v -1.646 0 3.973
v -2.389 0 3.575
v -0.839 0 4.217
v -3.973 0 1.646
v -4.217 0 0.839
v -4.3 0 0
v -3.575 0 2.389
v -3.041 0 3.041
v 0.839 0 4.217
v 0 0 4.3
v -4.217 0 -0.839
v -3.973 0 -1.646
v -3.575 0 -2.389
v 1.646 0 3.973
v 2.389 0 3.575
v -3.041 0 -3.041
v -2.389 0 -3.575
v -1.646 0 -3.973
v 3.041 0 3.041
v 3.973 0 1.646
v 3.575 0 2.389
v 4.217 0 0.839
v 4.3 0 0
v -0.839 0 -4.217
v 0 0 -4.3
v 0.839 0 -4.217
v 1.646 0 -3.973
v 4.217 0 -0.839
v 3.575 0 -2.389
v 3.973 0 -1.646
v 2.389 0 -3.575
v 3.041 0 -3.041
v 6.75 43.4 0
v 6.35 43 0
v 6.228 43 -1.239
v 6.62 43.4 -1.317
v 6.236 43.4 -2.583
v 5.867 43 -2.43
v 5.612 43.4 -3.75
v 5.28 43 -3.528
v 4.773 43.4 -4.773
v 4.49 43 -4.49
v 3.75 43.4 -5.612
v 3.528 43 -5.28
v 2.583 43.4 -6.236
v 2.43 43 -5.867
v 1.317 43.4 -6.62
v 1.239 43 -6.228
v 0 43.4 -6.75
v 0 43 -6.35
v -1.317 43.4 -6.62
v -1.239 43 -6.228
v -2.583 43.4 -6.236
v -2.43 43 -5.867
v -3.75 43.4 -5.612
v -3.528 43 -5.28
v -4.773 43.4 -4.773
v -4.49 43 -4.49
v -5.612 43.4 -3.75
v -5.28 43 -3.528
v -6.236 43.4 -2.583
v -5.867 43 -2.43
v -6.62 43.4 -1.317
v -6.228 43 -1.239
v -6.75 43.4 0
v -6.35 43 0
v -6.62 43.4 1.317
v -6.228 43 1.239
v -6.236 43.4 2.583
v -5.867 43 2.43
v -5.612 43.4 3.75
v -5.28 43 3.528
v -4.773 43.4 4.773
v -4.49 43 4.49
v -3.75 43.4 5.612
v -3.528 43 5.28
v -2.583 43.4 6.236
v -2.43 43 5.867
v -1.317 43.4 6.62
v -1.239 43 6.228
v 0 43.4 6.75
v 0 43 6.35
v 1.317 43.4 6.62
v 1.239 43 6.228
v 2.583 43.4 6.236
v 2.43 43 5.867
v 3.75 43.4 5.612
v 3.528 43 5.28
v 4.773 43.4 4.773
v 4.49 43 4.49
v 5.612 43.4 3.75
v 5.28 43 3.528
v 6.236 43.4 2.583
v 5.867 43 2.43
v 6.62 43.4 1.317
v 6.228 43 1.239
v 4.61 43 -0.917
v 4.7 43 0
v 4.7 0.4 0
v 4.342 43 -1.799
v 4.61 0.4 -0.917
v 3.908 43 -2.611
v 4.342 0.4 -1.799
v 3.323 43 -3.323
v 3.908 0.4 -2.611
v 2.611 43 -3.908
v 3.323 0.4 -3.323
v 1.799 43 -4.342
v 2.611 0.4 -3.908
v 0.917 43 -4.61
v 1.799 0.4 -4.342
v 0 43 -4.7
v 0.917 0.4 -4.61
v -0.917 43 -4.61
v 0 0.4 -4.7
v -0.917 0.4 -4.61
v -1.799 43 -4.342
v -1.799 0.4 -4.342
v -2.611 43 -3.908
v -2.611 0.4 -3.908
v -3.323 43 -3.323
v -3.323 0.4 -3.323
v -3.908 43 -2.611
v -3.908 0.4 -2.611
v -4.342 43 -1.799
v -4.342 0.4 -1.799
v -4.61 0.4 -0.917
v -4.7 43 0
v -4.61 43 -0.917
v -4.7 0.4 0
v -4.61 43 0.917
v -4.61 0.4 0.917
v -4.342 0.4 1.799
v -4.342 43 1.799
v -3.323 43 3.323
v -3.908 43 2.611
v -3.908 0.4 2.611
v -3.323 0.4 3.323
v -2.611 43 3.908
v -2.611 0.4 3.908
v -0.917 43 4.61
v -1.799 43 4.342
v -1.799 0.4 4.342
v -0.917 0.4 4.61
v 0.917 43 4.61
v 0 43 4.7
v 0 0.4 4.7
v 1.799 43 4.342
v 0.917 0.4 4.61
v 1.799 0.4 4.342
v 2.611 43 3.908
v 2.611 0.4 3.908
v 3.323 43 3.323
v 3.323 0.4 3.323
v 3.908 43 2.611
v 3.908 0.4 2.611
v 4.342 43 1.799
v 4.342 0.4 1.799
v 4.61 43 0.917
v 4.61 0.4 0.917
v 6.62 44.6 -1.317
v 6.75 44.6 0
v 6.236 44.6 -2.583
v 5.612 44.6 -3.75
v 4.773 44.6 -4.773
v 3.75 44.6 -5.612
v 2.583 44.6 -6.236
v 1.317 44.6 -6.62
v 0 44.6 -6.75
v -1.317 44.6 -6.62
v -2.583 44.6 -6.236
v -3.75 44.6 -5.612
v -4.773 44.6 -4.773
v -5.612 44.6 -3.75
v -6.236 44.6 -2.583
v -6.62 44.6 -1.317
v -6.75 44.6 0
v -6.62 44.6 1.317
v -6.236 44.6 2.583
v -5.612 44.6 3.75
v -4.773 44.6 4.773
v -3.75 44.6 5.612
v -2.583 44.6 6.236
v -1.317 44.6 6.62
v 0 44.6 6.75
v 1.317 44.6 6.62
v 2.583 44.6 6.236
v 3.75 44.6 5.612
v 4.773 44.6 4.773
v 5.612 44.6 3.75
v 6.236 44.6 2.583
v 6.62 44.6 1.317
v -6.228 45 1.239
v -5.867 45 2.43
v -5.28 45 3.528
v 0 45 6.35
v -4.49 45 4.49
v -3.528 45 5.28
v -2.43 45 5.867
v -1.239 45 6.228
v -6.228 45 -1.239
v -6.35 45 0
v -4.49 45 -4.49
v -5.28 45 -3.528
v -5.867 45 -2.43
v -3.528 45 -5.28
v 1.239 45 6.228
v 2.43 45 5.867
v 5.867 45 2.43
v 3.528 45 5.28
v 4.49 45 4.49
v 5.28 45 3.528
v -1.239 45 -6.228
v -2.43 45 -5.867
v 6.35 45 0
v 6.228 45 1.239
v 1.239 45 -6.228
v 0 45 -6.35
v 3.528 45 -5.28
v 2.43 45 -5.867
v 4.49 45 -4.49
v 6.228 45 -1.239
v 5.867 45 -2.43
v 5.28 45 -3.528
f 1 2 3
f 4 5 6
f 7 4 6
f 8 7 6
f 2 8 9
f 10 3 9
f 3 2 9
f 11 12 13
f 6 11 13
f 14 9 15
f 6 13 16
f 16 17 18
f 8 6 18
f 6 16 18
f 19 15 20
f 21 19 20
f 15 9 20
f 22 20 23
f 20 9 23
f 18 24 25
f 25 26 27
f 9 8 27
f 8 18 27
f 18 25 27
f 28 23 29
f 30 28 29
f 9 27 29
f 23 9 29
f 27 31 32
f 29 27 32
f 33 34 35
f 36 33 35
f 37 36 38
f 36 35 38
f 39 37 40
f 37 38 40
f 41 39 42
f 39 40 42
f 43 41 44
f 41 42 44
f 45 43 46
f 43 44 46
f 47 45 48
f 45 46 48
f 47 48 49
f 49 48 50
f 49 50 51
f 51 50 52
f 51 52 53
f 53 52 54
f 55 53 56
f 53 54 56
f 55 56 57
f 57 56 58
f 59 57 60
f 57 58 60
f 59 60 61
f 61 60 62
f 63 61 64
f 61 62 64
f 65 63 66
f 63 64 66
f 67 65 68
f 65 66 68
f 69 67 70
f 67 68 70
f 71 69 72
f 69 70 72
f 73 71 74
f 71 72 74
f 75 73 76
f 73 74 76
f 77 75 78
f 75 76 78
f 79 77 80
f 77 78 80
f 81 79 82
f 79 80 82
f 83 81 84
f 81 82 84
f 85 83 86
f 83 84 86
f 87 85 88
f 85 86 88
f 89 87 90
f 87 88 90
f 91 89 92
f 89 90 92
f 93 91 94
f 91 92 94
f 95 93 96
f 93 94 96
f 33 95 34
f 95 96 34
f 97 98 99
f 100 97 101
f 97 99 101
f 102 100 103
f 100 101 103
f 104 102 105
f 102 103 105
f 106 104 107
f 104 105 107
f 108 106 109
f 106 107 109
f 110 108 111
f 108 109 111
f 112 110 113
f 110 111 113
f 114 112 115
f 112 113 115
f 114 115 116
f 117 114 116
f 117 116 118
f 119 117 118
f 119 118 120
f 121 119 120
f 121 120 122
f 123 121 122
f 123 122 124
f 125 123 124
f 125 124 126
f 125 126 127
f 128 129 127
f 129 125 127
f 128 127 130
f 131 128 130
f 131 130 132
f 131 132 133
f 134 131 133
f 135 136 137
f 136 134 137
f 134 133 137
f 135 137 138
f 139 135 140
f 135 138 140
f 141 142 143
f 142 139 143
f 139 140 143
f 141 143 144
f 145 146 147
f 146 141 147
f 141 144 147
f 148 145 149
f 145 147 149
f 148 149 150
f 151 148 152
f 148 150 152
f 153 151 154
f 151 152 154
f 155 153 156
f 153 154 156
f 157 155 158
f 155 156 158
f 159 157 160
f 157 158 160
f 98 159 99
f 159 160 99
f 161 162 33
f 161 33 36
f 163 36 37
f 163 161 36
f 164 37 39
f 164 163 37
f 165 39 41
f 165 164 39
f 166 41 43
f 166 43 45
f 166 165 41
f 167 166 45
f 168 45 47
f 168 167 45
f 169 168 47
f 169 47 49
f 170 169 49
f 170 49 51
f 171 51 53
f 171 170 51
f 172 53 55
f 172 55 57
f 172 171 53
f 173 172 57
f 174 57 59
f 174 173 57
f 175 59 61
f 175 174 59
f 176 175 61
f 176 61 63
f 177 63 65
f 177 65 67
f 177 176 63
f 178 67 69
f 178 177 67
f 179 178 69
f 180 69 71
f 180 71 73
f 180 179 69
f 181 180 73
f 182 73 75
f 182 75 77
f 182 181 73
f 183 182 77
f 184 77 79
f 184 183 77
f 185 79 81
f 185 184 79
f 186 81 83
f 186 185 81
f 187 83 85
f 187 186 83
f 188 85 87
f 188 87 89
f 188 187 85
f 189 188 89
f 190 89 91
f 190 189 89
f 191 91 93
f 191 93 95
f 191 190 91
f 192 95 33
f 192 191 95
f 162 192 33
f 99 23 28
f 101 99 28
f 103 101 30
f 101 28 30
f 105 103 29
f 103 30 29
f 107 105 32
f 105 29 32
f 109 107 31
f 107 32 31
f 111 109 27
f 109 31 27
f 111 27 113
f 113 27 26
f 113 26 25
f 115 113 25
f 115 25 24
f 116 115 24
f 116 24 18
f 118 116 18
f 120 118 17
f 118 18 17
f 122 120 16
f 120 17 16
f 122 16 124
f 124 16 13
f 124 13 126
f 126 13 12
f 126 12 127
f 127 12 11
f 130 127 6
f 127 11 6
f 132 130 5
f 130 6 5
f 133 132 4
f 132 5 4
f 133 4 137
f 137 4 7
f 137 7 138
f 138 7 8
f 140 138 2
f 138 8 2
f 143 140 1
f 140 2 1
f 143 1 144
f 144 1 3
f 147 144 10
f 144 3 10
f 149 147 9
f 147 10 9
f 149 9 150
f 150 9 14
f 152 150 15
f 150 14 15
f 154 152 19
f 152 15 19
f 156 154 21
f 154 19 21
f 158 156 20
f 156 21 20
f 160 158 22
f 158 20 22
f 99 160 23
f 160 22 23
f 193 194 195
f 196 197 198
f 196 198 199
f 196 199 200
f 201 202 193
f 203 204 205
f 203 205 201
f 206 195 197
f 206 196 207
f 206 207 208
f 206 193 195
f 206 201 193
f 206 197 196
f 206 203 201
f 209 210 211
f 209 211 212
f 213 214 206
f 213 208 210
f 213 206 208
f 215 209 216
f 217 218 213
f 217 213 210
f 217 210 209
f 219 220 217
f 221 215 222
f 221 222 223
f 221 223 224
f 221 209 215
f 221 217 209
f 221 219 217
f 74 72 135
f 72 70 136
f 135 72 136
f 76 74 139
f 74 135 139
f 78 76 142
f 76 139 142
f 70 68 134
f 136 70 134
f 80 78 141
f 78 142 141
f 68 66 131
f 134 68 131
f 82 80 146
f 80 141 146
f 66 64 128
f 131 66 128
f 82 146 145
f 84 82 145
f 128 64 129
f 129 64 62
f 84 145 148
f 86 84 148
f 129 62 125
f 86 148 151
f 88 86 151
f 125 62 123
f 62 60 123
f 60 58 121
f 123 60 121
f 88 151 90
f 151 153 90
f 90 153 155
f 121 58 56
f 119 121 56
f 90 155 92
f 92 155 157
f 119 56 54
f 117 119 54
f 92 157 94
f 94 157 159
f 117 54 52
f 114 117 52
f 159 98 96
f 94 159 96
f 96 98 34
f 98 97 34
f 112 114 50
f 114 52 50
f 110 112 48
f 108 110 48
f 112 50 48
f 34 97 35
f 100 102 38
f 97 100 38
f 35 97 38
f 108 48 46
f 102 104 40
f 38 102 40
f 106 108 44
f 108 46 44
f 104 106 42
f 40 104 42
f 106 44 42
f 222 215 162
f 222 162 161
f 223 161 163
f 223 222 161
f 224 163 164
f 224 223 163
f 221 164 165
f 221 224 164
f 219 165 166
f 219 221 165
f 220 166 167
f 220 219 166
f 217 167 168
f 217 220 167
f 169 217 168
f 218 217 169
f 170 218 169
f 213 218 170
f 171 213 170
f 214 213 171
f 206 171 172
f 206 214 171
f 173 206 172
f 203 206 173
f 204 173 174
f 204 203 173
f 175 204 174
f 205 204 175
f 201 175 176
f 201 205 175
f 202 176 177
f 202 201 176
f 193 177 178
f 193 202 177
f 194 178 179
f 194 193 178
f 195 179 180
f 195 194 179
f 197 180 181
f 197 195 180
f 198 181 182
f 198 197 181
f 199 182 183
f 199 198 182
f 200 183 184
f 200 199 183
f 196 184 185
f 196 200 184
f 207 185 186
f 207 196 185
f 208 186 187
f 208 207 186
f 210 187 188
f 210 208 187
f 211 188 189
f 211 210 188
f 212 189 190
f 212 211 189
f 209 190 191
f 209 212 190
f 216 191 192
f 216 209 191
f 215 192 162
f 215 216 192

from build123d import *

# Parameters (mm, degrees)
SKETCH1_R           = 4.7
BOSS_EXTRUDE1_DEPTH = 45
SKETCH2_R           = 6.75
BOSS_EXTRUDE2_DEPTH = 2
CHAMFER2_SIZE       = 0.4
CHAMFER3_SIZE       = 0.4


with BuildPart() as part:
    # Sketch1 → Boss-Extrude1 (new body)
    with BuildSketch(Plane(origin=(0, 0, 0), x_dir=(1, 0, 0), z_dir=(0, 1, 0))):
        Circle(SKETCH1_R)
    extrude(amount=BOSS_EXTRUDE1_DEPTH)

    # Sketch2 → Boss-Extrude2 (add)
    with BuildSketch(Plane(origin=(0, 45, 0), x_dir=(1, 0, 0), z_dir=(0, 1, 0))):
        Circle(SKETCH2_R)
    extrude(amount=-BOSS_EXTRUDE2_DEPTH)

    # Chamfer2
    chamfer2_edges = [part.edges().sort_by_distance(p)[0] for p in [
        (-6.75, 43, 0),
        (-6.75, 45, 0),
    ]]
    chamfer(chamfer2_edges, length=CHAMFER2_SIZE)

    # Chamfer3
    chamfer3_edges = [part.edges().sort_by_distance(p)[0] for p in [
        (-4.7, 0, 0),
    ]]
    chamfer(chamfer3_edges, length=CHAMFER3_SIZE)


solid = part.part
